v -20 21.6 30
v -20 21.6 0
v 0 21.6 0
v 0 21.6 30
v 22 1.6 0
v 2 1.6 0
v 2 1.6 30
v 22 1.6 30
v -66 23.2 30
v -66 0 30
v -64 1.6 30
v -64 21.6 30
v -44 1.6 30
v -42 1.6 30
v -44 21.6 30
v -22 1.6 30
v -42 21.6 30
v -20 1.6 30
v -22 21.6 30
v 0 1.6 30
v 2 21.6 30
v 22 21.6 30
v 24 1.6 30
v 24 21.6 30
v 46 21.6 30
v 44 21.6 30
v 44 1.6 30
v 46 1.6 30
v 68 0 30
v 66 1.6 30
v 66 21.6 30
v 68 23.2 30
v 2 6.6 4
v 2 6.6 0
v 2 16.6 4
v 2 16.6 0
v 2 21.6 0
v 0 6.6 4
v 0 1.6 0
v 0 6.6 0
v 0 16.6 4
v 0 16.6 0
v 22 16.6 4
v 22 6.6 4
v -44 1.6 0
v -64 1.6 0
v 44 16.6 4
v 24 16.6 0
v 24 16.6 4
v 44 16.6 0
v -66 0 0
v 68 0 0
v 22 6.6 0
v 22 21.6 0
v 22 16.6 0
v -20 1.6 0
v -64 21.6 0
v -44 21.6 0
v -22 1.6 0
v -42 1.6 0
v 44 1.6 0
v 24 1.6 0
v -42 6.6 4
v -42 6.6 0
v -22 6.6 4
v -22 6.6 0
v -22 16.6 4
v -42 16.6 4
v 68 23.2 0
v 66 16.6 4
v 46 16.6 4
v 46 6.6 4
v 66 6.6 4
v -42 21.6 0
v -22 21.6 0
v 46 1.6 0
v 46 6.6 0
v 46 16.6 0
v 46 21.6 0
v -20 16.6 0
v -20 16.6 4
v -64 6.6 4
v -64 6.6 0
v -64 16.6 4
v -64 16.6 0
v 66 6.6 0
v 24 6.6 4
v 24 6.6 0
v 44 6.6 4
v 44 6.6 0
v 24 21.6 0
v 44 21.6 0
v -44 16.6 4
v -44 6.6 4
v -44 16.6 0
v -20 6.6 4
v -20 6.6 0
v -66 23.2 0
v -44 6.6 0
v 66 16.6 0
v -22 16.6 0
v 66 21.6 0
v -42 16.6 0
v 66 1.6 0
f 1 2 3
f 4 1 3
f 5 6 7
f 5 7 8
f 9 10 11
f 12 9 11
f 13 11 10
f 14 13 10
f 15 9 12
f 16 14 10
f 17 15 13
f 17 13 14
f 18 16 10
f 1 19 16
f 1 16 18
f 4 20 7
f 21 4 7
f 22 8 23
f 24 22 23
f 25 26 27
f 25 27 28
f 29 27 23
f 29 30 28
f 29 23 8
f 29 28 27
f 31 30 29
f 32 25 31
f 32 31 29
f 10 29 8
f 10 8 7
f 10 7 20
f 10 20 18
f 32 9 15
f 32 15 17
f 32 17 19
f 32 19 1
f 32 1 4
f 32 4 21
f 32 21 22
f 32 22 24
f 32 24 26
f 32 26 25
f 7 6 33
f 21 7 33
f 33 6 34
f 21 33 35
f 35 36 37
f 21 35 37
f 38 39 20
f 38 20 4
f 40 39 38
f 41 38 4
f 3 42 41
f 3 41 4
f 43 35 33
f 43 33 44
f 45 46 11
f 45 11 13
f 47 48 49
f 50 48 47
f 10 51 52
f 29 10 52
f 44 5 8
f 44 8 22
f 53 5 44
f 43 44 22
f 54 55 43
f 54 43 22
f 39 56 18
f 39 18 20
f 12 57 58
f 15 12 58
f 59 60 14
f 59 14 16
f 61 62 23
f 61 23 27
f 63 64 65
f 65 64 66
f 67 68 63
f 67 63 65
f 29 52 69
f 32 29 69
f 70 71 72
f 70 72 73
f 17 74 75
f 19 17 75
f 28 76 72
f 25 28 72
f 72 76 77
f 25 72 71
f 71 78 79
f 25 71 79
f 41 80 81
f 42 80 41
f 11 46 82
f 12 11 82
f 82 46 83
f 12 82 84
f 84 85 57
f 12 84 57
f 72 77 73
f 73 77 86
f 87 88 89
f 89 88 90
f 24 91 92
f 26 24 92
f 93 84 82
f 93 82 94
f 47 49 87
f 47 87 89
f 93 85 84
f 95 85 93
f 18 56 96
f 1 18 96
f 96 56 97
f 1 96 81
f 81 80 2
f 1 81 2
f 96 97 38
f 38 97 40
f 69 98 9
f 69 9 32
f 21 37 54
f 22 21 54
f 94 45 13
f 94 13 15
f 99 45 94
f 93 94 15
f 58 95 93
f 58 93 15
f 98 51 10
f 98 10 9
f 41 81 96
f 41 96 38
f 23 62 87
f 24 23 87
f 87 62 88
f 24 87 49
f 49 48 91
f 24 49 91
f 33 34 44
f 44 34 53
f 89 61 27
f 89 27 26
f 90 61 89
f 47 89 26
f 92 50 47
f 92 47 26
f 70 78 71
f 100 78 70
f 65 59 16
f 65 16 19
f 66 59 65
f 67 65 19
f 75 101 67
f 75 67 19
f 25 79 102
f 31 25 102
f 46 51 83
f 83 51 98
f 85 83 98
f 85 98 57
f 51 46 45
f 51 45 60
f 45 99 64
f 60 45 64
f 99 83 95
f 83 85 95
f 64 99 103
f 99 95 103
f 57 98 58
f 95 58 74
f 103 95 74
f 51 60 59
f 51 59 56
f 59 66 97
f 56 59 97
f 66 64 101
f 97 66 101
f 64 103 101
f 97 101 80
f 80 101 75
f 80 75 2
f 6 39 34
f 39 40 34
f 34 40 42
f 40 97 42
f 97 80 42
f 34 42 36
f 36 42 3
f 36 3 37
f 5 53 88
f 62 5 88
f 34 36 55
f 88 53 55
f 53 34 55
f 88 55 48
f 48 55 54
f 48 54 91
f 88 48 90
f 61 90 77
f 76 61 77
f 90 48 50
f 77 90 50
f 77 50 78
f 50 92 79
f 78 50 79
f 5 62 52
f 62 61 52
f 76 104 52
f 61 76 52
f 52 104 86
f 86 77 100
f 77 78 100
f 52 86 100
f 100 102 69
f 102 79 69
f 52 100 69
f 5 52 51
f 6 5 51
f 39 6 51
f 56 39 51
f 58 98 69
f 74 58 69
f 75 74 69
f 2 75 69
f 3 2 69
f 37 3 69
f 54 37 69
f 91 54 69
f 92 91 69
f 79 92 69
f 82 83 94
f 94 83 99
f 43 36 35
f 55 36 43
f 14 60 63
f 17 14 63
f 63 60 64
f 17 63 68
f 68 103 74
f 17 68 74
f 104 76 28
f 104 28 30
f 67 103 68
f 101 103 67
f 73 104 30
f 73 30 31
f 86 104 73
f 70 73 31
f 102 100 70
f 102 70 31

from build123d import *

# Parameters (mm, degrees)
F0_W     = 134
F0_H     = 23.2
F0_W_2   = 20
F0_H_2   = 20
F1_DEPTH = 30
F2_W     = 132
F2_H     = 10
F3_DEPTH = 4


with BuildPart() as f1:
    # F0 (on Top) → F1 (new body)
    with BuildSketch(Plane.XY):
        with Locations((1, 11.6)):
            Rectangle(F0_W, F0_H)
        with Locations((-54, 11.6)):
            Rectangle(F0_W_2, F0_H_2, mode=Mode.SUBTRACT)
        with Locations((-32, 11.6)):
            Rectangle(F0_W_2, F0_H_2, mode=Mode.SUBTRACT)
        with Locations((-10, 11.6)):
            Rectangle(F0_W_2, F0_H_2, mode=Mode.SUBTRACT)
        with Locations((12, 11.6)):
            Rectangle(F0_W_2, F0_H_2, mode=Mode.SUBTRACT)
        with Locations((34, 11.6)):
            Rectangle(F0_W_2, F0_H_2, mode=Mode.SUBTRACT)
        with Locations((56, 11.6)):
            Rectangle(F0_W_2, F0_H_2, mode=Mode.SUBTRACT)
    extrude(amount=F1_DEPTH)

    # F2 (on Top) → F3 (join)
    with BuildSketch(Plane.XY):
        with Locations((1, 11.6)):
            Rectangle(F2_W, F2_H)
    extrude(amount=F3_DEPTH)


solid = f1.part
